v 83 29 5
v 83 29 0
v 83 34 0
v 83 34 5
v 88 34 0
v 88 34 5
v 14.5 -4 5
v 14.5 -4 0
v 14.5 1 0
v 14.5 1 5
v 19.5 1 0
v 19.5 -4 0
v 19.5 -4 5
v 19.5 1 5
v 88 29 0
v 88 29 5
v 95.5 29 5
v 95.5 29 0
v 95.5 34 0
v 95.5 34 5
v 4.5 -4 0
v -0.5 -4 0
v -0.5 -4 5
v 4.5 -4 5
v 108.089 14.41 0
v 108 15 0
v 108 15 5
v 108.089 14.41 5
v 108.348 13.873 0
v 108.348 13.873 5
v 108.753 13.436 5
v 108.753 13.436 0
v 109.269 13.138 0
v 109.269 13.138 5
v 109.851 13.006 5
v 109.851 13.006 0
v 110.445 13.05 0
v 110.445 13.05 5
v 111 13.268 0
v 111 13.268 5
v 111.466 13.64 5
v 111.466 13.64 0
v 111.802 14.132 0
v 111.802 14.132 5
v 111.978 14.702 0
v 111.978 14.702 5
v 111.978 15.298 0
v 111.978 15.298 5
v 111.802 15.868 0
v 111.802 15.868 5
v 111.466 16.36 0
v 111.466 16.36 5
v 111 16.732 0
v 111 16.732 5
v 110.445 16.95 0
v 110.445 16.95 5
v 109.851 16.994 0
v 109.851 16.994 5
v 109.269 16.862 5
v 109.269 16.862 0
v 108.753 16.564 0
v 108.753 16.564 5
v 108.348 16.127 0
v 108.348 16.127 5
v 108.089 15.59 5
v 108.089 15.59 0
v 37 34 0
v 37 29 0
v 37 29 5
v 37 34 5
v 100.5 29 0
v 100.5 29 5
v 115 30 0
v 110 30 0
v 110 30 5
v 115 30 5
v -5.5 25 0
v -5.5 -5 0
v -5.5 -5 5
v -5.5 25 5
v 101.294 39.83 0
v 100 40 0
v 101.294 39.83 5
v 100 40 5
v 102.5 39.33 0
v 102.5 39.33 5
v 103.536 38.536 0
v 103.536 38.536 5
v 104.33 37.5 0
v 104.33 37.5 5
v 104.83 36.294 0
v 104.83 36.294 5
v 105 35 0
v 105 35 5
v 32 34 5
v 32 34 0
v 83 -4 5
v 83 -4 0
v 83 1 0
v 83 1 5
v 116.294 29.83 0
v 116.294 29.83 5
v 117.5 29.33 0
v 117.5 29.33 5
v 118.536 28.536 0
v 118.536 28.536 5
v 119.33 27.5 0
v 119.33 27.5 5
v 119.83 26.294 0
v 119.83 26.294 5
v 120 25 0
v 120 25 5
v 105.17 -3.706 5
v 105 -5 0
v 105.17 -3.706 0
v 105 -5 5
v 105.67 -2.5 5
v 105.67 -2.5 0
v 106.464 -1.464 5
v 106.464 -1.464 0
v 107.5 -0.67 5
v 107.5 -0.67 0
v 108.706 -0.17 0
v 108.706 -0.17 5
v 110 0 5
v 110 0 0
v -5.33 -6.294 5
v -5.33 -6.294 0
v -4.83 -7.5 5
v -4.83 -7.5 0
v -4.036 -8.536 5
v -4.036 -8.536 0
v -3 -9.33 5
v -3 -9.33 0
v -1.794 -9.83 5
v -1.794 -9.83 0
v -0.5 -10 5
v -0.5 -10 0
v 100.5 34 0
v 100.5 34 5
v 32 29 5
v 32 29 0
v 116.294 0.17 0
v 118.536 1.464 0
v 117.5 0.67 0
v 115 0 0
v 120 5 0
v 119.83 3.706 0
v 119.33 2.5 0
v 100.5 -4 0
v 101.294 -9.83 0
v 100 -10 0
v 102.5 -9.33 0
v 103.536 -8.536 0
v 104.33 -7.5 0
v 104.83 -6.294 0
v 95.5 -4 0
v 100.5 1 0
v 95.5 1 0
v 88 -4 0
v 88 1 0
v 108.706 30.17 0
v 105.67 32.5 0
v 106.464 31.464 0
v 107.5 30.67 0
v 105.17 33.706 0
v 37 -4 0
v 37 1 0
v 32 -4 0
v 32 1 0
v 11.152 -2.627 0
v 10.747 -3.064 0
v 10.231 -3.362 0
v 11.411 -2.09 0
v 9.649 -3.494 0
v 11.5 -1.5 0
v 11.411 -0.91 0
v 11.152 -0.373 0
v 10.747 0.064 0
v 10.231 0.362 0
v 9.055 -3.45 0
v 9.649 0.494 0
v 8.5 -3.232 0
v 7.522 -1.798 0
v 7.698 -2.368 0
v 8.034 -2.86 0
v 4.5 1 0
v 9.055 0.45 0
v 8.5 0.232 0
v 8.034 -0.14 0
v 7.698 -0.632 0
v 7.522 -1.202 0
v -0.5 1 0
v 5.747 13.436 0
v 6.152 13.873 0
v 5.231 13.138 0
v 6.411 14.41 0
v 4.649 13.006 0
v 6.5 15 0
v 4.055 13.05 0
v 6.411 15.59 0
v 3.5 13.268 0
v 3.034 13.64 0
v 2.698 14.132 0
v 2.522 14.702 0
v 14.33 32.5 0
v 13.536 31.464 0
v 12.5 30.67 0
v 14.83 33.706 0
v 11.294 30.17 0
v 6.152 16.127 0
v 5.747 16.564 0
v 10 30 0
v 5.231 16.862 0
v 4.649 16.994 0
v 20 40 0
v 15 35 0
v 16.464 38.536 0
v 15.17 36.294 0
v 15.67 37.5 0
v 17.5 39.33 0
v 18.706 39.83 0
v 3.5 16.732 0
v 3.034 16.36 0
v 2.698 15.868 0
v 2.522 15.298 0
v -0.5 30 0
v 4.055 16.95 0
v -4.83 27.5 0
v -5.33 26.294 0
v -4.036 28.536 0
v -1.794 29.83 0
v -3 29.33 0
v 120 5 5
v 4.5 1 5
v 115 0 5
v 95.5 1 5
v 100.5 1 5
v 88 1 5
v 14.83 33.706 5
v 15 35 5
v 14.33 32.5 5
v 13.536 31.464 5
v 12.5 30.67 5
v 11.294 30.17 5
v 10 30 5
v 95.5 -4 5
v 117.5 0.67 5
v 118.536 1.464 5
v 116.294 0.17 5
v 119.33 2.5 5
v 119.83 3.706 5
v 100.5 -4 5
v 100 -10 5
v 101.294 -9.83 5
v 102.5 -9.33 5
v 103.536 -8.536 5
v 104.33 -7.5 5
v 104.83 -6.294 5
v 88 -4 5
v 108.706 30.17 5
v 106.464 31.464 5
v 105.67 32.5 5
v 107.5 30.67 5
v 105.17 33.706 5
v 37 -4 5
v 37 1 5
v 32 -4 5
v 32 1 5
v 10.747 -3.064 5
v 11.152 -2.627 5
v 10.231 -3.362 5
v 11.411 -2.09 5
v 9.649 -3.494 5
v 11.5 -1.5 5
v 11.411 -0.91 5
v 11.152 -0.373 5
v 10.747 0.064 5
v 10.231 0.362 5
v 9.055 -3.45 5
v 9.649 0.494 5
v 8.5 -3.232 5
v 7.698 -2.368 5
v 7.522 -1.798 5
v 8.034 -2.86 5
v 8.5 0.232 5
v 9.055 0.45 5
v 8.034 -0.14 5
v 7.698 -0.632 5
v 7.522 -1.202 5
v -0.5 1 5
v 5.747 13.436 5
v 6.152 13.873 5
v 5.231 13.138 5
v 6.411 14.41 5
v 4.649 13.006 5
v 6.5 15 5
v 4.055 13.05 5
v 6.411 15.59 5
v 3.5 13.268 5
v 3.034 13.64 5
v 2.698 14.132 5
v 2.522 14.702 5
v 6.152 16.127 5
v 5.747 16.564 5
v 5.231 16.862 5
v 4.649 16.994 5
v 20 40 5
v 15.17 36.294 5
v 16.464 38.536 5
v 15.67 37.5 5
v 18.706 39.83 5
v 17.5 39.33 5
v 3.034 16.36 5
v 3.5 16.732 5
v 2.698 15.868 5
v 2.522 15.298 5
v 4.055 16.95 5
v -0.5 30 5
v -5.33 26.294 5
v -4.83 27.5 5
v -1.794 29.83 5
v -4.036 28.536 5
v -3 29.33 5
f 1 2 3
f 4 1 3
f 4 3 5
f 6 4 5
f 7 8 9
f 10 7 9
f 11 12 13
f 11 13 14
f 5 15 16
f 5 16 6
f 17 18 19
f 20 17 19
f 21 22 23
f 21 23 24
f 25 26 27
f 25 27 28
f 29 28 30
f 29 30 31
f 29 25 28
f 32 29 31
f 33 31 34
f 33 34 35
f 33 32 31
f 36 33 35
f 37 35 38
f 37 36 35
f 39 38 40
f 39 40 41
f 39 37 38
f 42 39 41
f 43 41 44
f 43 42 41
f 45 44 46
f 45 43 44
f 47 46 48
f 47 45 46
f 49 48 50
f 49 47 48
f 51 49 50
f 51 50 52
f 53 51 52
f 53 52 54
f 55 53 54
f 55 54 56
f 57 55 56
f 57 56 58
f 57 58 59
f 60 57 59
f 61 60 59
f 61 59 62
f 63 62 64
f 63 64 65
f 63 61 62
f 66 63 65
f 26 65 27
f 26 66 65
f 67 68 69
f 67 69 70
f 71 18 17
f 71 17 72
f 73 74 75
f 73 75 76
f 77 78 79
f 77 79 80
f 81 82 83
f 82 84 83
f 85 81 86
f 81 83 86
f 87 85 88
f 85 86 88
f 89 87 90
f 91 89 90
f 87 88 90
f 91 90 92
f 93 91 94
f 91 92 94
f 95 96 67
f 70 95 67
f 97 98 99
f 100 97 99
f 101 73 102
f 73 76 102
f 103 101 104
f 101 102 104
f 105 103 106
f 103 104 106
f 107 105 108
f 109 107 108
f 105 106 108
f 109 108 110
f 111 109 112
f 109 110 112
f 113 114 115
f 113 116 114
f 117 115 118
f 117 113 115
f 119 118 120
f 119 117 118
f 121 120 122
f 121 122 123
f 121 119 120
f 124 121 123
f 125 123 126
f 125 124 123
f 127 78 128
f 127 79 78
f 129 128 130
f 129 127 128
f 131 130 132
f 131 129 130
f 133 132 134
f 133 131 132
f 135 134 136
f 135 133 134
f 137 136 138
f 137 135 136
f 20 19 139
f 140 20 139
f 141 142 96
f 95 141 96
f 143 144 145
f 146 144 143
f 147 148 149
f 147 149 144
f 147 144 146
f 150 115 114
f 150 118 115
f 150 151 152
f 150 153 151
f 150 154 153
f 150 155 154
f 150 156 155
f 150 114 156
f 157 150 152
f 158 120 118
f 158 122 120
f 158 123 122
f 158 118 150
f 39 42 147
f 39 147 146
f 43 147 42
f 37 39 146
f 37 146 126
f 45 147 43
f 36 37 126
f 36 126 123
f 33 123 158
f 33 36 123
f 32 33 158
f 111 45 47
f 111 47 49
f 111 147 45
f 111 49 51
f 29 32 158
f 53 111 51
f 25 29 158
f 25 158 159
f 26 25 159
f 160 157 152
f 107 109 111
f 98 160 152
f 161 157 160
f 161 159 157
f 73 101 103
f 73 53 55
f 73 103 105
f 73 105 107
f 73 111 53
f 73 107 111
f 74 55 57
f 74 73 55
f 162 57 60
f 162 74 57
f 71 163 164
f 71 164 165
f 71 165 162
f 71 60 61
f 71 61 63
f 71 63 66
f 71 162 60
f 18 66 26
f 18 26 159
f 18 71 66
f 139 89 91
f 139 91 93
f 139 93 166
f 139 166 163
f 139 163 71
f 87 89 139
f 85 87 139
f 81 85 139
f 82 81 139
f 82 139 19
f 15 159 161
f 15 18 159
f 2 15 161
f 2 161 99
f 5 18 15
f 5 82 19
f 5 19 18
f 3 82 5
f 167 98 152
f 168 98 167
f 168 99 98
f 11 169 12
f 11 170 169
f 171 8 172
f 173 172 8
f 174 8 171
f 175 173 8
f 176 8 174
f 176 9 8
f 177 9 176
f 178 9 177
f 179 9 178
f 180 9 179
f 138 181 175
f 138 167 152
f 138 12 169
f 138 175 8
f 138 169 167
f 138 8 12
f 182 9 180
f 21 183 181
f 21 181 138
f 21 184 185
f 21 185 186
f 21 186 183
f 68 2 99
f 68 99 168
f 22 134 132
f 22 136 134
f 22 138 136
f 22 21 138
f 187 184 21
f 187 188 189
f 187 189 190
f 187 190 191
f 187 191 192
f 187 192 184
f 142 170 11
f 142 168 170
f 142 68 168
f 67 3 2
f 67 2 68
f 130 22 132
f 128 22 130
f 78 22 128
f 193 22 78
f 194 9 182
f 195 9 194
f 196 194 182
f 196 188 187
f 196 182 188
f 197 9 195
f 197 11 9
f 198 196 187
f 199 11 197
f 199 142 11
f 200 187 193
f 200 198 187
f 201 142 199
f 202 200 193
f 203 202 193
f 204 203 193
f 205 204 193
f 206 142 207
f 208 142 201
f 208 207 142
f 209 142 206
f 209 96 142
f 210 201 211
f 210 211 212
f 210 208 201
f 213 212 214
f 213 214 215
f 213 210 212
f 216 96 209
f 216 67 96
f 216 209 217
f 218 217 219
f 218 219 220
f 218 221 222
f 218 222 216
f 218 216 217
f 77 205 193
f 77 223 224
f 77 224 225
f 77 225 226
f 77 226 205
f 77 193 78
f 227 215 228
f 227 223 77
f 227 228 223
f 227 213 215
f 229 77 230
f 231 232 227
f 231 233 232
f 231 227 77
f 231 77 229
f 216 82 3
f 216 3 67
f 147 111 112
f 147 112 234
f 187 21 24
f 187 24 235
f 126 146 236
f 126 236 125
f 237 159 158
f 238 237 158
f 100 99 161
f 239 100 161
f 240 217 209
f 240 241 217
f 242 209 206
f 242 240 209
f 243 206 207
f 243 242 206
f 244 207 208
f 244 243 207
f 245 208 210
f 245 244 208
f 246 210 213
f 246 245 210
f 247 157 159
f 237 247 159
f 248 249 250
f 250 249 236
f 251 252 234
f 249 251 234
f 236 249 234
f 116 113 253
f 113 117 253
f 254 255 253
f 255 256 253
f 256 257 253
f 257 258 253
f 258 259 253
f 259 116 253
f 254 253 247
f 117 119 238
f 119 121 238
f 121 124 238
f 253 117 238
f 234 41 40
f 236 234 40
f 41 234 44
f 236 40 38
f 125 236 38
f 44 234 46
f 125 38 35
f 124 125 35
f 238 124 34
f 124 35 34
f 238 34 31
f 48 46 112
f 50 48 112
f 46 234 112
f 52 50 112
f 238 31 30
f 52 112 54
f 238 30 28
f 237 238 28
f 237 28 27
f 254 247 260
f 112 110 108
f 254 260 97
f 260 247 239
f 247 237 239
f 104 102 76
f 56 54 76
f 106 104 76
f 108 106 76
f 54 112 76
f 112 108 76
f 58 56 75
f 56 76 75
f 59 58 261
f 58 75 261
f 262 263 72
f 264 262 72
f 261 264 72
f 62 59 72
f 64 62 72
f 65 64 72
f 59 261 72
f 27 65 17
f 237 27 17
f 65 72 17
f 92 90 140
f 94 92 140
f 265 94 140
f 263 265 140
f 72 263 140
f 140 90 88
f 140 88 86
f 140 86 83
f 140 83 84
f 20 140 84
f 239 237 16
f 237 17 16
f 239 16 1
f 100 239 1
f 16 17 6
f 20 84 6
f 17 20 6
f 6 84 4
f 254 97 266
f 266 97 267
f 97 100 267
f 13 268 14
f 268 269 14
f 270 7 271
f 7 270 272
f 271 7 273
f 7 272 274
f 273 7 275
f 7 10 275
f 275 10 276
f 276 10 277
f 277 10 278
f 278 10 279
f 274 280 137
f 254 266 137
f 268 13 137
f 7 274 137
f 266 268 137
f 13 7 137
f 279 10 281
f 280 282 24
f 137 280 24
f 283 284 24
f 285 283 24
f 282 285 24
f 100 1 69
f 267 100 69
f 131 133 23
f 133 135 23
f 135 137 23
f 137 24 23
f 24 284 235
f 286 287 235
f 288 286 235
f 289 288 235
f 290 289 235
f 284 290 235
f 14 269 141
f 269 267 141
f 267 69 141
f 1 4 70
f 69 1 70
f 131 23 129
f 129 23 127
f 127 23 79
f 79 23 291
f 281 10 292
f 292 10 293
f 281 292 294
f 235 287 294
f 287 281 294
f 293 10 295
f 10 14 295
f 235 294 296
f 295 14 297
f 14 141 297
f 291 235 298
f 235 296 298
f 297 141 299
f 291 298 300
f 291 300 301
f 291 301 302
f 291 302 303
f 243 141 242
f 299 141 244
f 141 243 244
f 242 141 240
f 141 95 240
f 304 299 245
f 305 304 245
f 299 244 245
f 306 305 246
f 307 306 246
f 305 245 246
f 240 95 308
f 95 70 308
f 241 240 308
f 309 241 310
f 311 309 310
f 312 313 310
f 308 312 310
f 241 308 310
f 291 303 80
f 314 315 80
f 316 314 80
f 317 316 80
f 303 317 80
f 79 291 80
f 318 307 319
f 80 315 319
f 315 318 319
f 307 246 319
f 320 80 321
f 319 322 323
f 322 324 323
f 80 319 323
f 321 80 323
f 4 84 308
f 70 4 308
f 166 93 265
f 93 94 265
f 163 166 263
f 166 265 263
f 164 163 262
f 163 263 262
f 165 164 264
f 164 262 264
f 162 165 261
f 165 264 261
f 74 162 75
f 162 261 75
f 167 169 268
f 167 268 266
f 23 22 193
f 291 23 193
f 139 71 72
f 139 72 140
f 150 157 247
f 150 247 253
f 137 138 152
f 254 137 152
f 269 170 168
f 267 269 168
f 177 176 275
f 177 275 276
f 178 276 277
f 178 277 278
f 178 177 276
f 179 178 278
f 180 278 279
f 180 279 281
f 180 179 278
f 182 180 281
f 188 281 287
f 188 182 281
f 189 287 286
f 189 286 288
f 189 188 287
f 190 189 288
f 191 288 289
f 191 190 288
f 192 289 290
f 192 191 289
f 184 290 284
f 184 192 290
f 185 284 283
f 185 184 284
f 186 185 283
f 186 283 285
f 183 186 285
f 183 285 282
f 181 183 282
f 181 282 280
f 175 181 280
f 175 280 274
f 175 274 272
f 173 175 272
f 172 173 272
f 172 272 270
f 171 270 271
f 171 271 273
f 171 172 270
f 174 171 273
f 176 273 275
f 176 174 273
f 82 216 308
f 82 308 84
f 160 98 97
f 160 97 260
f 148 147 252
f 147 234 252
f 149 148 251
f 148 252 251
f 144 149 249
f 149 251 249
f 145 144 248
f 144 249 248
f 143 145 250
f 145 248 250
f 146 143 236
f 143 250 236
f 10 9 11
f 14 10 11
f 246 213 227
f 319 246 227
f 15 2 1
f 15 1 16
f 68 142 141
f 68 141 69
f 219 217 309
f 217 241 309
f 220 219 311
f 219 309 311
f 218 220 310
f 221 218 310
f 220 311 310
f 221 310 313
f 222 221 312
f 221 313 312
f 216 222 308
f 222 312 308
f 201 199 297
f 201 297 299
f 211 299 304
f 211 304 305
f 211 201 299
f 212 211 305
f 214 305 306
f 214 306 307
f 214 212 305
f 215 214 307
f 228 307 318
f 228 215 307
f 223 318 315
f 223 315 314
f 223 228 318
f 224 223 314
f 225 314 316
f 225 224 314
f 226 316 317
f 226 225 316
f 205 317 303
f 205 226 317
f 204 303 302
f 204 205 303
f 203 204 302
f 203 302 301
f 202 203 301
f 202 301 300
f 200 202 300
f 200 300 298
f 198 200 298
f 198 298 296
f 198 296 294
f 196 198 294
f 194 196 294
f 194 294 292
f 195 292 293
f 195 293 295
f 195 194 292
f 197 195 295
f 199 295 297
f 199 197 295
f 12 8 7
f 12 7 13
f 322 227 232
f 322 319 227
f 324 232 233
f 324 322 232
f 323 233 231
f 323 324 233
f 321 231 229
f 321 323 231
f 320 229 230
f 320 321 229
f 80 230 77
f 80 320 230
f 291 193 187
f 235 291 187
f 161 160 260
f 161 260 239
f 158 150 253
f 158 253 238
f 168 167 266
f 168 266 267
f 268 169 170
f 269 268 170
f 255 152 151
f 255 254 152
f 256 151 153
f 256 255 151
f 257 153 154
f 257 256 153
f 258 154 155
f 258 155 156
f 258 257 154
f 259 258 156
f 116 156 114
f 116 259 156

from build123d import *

# Parameters (mm, degrees)
ESQUISSE1_R        = 2
ESQUISSE1_W        = 5
ESQUISSE1_H        = 5
BOSS_EXTRU_1_DEPTH = 5
CONG_1_R           = 5


with BuildPart() as part:
    # Esquisse1 → Boss.-Extru.1 (new body)
    with BuildSketch(Plane.XY):
        Polygon((15, 30), (15, 40), (105, 40), (105, 30), (120, 30), (120, 0), (105, 0), (105, -10), (15, -10), (-5.5, -10), (-5.5, 30), (0, 30), align=None)
        with Locations(Location((110, 15, 0), (0, 0, 180))):
            Circle(ESQUISSE1_R, mode=Mode.SUBTRACT)
        with Locations((4.5, 15)):
            Circle(ESQUISSE1_R, mode=Mode.SUBTRACT)
        with Locations((9.5, -1.5)):
            Circle(ESQUISSE1_R, mode=Mode.SUBTRACT)
        with Locations((85.5, 31.5)):
            Rectangle(ESQUISSE1_W, ESQUISSE1_H, mode=Mode.SUBTRACT)
        with Locations((34.5, 31.5)):
            Rectangle(ESQUISSE1_W, ESQUISSE1_H, mode=Mode.SUBTRACT)
        with Locations((85.5, -1.5)):
            Rectangle(ESQUISSE1_W, ESQUISSE1_H, mode=Mode.SUBTRACT)
        with Locations((34.5, -1.5)):
            Rectangle(ESQUISSE1_W, ESQUISSE1_H, mode=Mode.SUBTRACT)
        with Locations((98, -1.5)):
            Rectangle(ESQUISSE1_W, ESQUISSE1_H, mode=Mode.SUBTRACT)
        with Locations((98, 31.5)):
            Rectangle(ESQUISSE1_W, ESQUISSE1_H, mode=Mode.SUBTRACT)
        with Locations((2, -1.5)):
            Rectangle(ESQUISSE1_W, ESQUISSE1_H, mode=Mode.SUBTRACT)
        with Locations((17, -1.5)):
            Rectangle(ESQUISSE1_W, ESQUISSE1_H, mode=Mode.SUBTRACT)
    extrude(amount=BOSS_EXTRU_1_DEPTH)

    # Congé1
    cong_1_edges = [part.edges().sort_by_distance(p)[0] for p in [
        (105, -10, 2.5),
        (105, 0, 2.5),
        (120, 0, 2.5),
        (120, 30, 2.5),
        (105, 30, 2.5),
        (105, 40, 2.5),
        (15, 40, 2.5),
        (15, 30, 2.5),
        (-5.5, -10, 2.5),
        (-5.5, 30, 2.5),
    ]]
    fillet(cong_1_edges, radius=CONG_1_R - 0.0001)  # a hair under: the kernel refuses the full size


solid = part.part
